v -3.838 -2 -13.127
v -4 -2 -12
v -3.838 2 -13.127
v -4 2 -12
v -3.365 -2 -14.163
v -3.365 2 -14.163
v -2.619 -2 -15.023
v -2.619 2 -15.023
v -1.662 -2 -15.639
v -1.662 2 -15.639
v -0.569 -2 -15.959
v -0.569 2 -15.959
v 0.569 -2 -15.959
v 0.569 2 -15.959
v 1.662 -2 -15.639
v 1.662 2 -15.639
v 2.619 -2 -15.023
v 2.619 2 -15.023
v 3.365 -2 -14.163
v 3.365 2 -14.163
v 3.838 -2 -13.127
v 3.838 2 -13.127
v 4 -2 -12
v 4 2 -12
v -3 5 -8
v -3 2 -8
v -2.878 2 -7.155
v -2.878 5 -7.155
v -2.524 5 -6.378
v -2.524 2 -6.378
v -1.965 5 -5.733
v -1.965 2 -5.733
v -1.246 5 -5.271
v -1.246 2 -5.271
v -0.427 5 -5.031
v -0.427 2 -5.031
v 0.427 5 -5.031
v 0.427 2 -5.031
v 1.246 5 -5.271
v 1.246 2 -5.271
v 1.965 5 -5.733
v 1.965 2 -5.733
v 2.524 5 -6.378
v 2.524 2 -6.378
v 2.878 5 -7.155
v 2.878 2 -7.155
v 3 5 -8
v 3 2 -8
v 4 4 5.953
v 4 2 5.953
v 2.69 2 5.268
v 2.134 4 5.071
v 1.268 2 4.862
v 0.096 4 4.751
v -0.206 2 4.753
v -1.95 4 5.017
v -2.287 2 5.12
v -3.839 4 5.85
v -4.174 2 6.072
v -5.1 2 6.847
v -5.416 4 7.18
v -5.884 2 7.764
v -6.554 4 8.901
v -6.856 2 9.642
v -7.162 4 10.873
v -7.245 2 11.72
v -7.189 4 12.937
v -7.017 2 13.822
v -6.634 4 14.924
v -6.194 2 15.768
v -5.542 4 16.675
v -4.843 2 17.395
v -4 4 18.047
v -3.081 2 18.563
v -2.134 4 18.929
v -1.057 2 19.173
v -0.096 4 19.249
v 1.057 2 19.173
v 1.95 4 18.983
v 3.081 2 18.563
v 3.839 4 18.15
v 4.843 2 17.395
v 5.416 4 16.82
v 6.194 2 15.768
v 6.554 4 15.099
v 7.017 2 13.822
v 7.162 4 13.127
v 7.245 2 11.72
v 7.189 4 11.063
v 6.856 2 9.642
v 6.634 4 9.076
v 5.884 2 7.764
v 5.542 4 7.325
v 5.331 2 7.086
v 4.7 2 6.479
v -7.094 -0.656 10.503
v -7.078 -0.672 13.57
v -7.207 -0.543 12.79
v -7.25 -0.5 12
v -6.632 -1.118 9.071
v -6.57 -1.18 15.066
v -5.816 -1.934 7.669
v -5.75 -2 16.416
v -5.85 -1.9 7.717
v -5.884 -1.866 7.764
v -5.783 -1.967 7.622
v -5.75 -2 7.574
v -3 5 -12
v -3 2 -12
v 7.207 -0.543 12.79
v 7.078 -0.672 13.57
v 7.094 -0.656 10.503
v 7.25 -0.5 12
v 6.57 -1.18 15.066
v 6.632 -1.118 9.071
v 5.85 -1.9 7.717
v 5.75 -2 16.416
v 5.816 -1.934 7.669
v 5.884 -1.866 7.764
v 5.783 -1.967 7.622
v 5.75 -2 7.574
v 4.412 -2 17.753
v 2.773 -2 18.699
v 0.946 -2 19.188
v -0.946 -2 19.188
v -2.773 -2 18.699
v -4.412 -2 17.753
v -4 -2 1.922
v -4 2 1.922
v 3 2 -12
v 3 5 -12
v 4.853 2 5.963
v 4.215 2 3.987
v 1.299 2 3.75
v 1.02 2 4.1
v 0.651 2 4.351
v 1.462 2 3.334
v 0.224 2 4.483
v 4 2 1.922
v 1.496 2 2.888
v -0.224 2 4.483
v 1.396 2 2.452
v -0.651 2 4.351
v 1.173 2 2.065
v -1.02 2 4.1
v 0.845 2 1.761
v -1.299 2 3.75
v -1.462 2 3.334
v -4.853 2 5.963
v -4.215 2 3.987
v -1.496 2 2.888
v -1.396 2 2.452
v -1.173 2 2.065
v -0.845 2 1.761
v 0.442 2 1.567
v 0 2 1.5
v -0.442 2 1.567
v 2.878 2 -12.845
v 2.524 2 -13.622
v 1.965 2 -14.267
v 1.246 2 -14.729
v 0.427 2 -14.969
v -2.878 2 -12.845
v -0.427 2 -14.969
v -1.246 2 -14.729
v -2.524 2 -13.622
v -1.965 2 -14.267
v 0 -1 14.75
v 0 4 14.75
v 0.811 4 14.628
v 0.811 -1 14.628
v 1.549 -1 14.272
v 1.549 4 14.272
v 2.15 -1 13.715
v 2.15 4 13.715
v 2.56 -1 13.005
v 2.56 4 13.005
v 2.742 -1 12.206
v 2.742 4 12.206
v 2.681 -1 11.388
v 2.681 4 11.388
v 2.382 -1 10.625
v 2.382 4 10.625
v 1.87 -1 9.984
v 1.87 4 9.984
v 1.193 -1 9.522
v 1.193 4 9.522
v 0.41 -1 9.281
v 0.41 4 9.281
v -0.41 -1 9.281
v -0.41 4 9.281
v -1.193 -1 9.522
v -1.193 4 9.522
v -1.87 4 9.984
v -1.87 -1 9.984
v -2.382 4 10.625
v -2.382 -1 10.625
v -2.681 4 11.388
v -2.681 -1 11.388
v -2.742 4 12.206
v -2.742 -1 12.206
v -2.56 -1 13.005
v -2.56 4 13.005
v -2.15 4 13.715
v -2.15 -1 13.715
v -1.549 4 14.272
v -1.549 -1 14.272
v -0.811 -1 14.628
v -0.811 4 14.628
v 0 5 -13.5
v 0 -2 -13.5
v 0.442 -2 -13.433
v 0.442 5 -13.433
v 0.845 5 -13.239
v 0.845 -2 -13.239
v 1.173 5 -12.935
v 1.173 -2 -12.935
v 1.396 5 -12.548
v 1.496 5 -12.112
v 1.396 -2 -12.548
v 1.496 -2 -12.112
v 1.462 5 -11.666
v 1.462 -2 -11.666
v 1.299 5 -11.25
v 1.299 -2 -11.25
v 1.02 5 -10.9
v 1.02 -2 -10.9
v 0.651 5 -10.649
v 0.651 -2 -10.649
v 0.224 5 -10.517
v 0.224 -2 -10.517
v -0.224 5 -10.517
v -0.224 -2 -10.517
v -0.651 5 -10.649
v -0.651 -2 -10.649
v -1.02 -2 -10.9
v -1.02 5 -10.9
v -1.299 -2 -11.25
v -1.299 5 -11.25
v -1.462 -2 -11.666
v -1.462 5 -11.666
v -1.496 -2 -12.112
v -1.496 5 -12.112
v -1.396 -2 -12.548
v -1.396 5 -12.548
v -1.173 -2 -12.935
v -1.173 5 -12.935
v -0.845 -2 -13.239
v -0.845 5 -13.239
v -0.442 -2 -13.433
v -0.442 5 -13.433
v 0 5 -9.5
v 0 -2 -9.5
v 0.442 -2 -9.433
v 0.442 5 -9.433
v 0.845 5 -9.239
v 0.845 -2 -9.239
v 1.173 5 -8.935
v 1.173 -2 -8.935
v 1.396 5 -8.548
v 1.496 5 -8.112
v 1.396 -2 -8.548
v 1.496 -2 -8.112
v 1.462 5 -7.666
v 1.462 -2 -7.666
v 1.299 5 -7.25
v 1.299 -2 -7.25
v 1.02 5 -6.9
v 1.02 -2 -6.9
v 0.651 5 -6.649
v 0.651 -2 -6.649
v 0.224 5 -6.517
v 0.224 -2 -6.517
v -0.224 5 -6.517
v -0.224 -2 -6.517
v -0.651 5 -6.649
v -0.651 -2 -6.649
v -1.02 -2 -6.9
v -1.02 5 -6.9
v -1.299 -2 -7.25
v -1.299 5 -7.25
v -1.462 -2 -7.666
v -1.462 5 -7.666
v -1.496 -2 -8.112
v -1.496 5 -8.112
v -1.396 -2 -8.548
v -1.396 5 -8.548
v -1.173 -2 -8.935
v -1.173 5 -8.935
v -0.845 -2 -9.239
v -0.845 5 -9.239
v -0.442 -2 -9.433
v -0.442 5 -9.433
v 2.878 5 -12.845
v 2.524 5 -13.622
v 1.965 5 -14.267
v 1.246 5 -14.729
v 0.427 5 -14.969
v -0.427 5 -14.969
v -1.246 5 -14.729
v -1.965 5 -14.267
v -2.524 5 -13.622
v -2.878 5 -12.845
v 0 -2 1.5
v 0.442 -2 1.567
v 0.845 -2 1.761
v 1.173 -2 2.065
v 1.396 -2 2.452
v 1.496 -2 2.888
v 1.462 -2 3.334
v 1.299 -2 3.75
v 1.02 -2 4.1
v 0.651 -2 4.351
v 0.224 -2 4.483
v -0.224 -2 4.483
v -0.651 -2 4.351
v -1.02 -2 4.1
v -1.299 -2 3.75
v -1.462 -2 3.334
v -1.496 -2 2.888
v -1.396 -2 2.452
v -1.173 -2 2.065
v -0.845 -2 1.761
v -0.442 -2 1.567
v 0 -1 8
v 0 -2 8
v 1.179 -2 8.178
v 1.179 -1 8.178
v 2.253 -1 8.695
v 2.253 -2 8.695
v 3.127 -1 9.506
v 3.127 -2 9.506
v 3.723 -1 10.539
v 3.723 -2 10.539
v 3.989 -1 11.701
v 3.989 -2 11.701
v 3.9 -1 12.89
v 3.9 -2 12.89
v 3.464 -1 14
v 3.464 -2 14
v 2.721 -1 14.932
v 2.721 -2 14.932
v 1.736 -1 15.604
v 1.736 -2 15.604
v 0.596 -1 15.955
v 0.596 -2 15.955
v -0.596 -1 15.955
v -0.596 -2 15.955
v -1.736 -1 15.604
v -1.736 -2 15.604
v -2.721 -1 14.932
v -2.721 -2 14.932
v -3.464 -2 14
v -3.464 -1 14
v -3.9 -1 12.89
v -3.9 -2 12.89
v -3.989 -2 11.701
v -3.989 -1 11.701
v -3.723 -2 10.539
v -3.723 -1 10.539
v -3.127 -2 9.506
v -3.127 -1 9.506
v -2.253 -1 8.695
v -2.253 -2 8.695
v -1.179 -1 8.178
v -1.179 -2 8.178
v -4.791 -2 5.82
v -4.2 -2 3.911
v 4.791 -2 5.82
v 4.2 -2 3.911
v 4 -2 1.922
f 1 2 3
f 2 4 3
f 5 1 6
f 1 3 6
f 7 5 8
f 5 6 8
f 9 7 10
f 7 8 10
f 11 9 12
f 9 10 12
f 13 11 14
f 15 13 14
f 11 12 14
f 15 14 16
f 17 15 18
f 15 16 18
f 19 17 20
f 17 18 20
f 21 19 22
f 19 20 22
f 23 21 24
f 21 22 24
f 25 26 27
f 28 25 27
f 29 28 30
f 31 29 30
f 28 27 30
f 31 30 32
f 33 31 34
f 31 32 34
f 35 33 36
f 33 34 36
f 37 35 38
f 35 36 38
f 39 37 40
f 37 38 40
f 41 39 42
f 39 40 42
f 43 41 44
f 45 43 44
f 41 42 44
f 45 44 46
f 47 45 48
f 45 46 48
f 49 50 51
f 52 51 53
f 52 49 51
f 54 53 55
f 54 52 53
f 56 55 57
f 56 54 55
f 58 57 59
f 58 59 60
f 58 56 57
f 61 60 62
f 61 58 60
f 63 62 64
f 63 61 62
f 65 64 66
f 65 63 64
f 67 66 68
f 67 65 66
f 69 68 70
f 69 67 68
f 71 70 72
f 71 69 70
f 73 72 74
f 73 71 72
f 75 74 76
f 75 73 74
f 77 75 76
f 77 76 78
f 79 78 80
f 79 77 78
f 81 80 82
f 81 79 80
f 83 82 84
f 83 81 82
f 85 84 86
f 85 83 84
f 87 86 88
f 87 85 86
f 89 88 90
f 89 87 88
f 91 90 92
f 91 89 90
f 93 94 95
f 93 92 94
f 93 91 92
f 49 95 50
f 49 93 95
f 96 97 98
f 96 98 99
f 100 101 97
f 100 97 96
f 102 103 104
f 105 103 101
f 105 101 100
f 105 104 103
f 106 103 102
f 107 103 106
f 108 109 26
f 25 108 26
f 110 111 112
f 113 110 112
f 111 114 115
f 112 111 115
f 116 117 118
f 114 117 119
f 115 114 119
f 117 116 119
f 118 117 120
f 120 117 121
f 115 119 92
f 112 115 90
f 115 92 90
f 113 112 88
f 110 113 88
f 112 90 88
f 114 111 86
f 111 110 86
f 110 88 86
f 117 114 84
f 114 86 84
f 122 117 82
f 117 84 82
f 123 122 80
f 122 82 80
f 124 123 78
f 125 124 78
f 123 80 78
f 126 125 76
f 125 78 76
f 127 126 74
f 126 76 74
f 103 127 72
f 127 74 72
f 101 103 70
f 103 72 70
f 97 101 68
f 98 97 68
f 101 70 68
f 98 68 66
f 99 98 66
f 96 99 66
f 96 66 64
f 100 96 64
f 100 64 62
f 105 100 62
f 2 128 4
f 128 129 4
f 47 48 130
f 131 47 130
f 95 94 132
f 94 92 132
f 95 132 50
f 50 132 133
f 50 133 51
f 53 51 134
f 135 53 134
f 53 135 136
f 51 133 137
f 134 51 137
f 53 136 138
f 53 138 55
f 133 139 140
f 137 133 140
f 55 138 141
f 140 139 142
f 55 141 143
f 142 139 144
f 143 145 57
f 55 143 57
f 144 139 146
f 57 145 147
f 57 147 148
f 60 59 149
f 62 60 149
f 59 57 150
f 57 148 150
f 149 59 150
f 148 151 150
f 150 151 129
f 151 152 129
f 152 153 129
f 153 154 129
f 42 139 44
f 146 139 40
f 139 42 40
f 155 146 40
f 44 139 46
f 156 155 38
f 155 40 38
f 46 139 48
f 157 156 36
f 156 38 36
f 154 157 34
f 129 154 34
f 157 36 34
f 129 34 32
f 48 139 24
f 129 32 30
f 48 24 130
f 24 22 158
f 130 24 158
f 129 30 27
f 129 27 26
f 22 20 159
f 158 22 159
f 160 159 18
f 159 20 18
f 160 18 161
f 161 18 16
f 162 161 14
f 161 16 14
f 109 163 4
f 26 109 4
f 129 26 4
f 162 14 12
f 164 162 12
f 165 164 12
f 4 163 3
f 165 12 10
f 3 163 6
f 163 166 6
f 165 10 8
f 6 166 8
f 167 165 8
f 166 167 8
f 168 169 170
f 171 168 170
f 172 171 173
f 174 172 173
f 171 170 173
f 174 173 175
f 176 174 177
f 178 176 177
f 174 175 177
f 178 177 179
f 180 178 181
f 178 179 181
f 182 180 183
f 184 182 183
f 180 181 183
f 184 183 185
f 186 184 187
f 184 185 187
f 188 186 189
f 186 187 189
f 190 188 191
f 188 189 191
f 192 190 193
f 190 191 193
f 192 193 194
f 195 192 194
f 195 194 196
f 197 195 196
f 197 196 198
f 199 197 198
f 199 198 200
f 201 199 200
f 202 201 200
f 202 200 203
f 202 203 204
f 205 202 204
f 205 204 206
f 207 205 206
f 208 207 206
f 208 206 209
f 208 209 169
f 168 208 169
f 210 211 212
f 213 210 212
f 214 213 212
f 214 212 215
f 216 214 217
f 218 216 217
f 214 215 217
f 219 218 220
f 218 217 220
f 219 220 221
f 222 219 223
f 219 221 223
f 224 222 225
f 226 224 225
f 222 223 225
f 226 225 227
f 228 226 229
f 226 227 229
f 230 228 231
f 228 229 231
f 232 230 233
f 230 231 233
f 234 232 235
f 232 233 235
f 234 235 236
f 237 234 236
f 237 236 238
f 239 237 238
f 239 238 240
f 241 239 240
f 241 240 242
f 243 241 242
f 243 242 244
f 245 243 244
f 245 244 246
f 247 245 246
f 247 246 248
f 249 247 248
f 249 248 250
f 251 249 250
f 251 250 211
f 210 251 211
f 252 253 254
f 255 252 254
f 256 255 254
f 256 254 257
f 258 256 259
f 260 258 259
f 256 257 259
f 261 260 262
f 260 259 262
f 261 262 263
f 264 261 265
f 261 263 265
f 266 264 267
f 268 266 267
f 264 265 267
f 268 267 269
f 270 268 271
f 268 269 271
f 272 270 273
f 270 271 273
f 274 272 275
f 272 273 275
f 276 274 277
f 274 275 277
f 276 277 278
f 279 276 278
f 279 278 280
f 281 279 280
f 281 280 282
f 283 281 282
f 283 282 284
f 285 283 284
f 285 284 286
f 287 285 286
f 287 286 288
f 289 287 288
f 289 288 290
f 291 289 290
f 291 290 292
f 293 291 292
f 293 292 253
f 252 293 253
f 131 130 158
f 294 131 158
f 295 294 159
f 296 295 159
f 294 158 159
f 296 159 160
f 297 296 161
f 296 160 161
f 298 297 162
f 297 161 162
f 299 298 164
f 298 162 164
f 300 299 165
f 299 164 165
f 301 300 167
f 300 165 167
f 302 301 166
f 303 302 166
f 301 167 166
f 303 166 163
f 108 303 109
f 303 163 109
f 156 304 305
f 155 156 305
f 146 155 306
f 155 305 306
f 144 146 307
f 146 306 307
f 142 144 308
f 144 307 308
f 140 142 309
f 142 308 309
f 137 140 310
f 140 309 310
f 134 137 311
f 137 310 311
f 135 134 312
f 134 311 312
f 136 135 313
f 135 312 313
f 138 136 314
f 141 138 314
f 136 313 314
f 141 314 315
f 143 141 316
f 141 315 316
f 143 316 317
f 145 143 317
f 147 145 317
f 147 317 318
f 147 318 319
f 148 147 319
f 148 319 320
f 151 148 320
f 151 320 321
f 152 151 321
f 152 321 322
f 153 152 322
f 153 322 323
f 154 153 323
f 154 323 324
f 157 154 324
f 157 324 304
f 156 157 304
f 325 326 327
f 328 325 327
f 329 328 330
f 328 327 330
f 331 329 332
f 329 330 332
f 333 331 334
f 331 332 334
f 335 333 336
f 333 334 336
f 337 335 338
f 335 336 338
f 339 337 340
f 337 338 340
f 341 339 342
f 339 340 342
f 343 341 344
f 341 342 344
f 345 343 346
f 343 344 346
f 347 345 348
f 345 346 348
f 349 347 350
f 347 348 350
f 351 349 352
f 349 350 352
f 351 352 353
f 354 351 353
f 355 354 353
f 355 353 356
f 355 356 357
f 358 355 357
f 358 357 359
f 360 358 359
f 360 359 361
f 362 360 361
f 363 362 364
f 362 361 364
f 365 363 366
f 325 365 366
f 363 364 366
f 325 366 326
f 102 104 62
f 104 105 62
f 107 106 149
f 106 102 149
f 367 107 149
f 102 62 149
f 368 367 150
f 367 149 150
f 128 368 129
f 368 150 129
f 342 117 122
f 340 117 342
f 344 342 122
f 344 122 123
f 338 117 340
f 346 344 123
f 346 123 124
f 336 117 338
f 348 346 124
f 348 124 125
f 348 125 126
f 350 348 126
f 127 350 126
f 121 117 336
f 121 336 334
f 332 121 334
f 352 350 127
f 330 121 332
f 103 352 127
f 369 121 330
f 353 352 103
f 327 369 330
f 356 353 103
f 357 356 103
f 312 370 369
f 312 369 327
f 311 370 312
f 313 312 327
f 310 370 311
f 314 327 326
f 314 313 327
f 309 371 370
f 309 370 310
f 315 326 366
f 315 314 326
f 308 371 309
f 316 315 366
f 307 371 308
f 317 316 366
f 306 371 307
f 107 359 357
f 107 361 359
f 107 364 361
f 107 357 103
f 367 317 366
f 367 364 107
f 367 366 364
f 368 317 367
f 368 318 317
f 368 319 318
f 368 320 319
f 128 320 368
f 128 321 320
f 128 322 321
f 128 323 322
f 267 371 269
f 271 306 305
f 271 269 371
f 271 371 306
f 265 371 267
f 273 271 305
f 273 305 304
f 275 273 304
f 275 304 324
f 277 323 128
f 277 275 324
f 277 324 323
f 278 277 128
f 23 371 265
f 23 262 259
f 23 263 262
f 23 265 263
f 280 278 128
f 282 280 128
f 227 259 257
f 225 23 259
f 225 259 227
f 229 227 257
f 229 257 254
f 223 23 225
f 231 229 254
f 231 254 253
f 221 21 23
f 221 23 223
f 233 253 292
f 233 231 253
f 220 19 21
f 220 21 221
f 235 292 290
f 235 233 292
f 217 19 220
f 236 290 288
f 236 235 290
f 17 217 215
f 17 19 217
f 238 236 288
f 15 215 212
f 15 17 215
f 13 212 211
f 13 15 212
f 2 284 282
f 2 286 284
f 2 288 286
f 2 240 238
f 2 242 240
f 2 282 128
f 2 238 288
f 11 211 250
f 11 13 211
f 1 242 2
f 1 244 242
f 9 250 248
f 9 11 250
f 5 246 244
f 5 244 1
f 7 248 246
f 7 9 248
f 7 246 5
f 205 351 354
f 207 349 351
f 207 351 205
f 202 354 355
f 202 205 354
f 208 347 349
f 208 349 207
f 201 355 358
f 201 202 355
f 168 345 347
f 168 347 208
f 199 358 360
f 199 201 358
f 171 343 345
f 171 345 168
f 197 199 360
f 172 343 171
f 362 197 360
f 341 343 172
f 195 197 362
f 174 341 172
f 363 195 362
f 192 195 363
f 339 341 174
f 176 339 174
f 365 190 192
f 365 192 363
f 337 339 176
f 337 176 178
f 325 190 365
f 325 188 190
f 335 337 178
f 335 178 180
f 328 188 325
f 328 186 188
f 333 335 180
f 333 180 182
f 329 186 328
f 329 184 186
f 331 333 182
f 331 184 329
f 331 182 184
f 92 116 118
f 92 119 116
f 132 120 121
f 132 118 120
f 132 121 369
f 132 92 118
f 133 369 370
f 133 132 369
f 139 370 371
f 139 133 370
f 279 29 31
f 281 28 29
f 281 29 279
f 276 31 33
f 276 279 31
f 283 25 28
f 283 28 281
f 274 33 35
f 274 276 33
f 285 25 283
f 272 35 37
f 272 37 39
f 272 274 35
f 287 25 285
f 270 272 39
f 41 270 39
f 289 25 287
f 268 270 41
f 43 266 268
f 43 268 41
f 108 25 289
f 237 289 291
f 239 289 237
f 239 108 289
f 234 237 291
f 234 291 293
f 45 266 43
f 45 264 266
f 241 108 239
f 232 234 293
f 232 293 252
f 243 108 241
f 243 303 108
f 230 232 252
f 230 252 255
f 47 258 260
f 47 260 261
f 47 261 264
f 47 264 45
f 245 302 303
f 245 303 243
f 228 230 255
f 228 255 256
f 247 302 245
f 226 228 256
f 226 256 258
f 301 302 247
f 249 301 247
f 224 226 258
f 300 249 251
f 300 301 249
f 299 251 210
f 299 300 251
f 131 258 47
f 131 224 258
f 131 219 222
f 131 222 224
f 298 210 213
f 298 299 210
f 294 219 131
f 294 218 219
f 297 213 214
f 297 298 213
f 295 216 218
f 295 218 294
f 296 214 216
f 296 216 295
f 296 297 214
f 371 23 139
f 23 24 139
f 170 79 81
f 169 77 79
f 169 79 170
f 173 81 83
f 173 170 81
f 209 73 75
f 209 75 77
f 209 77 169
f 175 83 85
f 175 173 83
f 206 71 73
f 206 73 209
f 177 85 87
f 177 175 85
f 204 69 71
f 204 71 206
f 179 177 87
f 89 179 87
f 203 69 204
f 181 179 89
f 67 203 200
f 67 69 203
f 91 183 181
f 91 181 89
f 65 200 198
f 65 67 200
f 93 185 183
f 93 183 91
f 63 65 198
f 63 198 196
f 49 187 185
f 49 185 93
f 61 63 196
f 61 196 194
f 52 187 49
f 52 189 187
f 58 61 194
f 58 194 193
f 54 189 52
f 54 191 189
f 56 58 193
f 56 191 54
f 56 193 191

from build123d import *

# Parameters (mm, degrees)
BOSS_EXTRUDE1_DEPTH = 2
BOSS_EXTRUDE2_START = 2
SKETCH2_R           = 7.25
BOSS_EXTRUDE2_DEPTH = 2
BOSS_EXTRUDE3_DEPTH = 3
SKETCH4_R           = 2.75
CUT_EXTRUDE1_DEPTH  = 22.427202337
SKETCH5_R           = 4
CUT_EXTRUDE2_DEPTH  = 1
SKETCH6_R           = 1.5
CUT_EXTRUDE3_DEPTH  = 22.728437588
FILLET1_R           = 10
CUT_EXTRUDE4_DEPTH  = 18


with BuildPart() as part:
    # Sketch1 → Boss-Extrude1 (new, symmetric)
    with BuildSketch(Plane(origin=(0, 0, 0), x_dir=(1, 0, 0), z_dir=(0, 1, 0))):
        with BuildLine():
            Line((-4, -5.953306689), (-4, 12))
            ThreePointArc((-4, 12), (0, 16), (4, 12))
            Line((4, 12), (4, -5.953306689))
            ThreePointArc((4, -5.953306689), (0, -19.25), (-4, -5.953306689))
        make_face()
    extrude(amount=BOSS_EXTRUDE1_DEPTH, both=True)

    # Sketch2 → Boss-Extrude2 (add)
    with BuildSketch(Plane(origin=(0, 2, 0), x_dir=(1, 0, 0), z_dir=(0, 1, 0)).offset(BOSS_EXTRUDE2_START)):
        with Locations(Location((0, -12, 0), (0, 0, 56.514623377))):
            Circle(SKETCH2_R)
    extrude(amount=-BOSS_EXTRUDE2_DEPTH)

    # Sketch3 → Boss-Extrude3 (add)
    with BuildSketch(Plane(origin=(0, 2, 0), x_dir=(1, 0, 0), z_dir=(0, 1, 0))):
        with BuildLine():
            Line((-3, 12), (-3, 8))
            ThreePointArc((-3, 8), (0, 5), (3, 8))
            Line((3, 8), (3, 12))
            ThreePointArc((3, 12), (0, 15), (-3, 12))
        make_face()
    extrude(amount=BOSS_EXTRUDE3_DEPTH)

    # Sketch4 → Cut-Extrude1 (cut, through all)
    with BuildSketch(Plane(origin=(0, 4, 0), x_dir=(1, 0, 0), z_dir=(0, 1, 0))):
        with Locations(Location((0, -12, 0), (0, 0, 270))):
            Circle(SKETCH4_R)
    extrude(amount=-CUT_EXTRUDE1_DEPTH, mode=Mode.SUBTRACT)

    # Sketch5 → Cut-Extrude2 (cut)
    with BuildSketch(Plane.XZ.offset(2)):
        with Locations(Location((0, 12, 0), (0, 0, 270))):
            Circle(SKETCH5_R)
    extrude(amount=-CUT_EXTRUDE2_DEPTH, mode=Mode.SUBTRACT)

    # Sketch6 → Cut-Extrude3 (cut, through all)
    with BuildSketch(Plane.XZ.offset(2)):
        with Locations(Location((0, -12, 0), (0, 0, 270))):
            Circle(SKETCH6_R)
        with Locations(Location((0, -8, 0), (0, 0, 270))):
            Circle(SKETCH6_R)
        with Locations(Location((0, 3, 0), (0, 0, 270))):
            Circle(SKETCH6_R)
    extrude(amount=-CUT_EXTRUDE3_DEPTH, mode=Mode.SUBTRACT)

    # Fillet1
    fillet1_edges = [part.edges().sort_by_distance(p)[0] for p in [
        (-4, 0, 5.953306689),
        (4, 0, 5.953306689),
    ]]
    fillet(fillet1_edges, radius=FILLET1_R)

    # Sketch7 → Cut-Extrude4 (cut)
    with BuildSketch(Plane.XY):
        Polygon((-7.25, -2), (-5.75, -2), (-7.25, -0.5), align=None)
        Polygon((7.25, -2), (5.75, -2), (7.25, -0.5), align=None)
    extrude(amount=CUT_EXTRUDE4_DEPTH, mode=Mode.SUBTRACT)


solid = part.part
